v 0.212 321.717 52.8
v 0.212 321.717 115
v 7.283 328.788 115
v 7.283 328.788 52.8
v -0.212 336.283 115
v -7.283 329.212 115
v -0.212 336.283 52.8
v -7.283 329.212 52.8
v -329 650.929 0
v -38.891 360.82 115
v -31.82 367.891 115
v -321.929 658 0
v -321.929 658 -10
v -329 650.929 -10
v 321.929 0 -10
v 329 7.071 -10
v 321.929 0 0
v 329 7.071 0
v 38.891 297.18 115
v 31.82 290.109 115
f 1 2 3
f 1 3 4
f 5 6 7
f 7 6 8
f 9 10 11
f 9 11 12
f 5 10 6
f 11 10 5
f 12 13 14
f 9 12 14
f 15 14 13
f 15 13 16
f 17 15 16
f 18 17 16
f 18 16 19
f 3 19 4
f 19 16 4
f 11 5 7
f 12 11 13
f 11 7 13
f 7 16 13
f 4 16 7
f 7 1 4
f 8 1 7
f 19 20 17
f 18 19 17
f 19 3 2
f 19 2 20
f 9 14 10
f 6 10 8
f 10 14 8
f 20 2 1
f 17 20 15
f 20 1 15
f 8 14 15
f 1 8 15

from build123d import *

# Parameters (mm, degrees)
BOSS_EXTRUDE1_DEPTH      = 115
BOSS_EXTRUDE1_DEPTH_BACK = 10
CUT_EXTRUDE1_DEPTH       = 10
SKETCH4_W                = 10.6
SKETCH4_H                = 62.2
CUT_EXTRUDE2_DEPTH       = 708.343268859


with BuildPart() as part:
    # Sketch2 → Boss-Extrude1 (new, two sides: drawn at the far end of the back side and taken through both)
    with BuildSketch(Plane.XY.offset(-BOSS_EXTRUDE1_DEPTH_BACK)):
        Polygon((321.928932188, 0), (329, 7.071067812), (-321.928932188, 658), (-329, 650.928932188), align=None)
    extrude(amount=BOSS_EXTRUDE1_DEPTH + BOSS_EXTRUDE1_DEPTH_BACK)

    # Sketch3 → Cut-Extrude1 (cut)
    with BuildSketch(Plane(origin=(160.964466094, 160.964466094, 0), x_dir=(-0.7071067811865476, 0.7071067811865476, 0), z_dir=(-0.7071067811865476, -0.7071067811865476, 0))):
        Polygon((-227.63813101, -115), (182.63813101, -115), (-227.63813101, 0), align=None)
        Polygon((692.914393031, -115), (282.63813101, -115), (692.914393031, 0), align=None)
    extrude(amount=-CUT_EXTRUDE1_DEPTH, mode=Mode.SUBTRACT)

    # Sketch4 → Cut-Extrude2 (cut, through all)
    with BuildSketch(Plane(origin=(160.964466094, 160.964466094, 0), x_dir=(-0.7071067811865476, 0.7071067811865476, 0), z_dir=(-0.7071067811865476, -0.7071067811865476, 0))):
        with Locations((232.63813101, -83.9)):
            Rectangle(SKETCH4_W, SKETCH4_H)
    extrude(amount=-CUT_EXTRUDE2_DEPTH, mode=Mode.SUBTRACT)


solid = part.part
